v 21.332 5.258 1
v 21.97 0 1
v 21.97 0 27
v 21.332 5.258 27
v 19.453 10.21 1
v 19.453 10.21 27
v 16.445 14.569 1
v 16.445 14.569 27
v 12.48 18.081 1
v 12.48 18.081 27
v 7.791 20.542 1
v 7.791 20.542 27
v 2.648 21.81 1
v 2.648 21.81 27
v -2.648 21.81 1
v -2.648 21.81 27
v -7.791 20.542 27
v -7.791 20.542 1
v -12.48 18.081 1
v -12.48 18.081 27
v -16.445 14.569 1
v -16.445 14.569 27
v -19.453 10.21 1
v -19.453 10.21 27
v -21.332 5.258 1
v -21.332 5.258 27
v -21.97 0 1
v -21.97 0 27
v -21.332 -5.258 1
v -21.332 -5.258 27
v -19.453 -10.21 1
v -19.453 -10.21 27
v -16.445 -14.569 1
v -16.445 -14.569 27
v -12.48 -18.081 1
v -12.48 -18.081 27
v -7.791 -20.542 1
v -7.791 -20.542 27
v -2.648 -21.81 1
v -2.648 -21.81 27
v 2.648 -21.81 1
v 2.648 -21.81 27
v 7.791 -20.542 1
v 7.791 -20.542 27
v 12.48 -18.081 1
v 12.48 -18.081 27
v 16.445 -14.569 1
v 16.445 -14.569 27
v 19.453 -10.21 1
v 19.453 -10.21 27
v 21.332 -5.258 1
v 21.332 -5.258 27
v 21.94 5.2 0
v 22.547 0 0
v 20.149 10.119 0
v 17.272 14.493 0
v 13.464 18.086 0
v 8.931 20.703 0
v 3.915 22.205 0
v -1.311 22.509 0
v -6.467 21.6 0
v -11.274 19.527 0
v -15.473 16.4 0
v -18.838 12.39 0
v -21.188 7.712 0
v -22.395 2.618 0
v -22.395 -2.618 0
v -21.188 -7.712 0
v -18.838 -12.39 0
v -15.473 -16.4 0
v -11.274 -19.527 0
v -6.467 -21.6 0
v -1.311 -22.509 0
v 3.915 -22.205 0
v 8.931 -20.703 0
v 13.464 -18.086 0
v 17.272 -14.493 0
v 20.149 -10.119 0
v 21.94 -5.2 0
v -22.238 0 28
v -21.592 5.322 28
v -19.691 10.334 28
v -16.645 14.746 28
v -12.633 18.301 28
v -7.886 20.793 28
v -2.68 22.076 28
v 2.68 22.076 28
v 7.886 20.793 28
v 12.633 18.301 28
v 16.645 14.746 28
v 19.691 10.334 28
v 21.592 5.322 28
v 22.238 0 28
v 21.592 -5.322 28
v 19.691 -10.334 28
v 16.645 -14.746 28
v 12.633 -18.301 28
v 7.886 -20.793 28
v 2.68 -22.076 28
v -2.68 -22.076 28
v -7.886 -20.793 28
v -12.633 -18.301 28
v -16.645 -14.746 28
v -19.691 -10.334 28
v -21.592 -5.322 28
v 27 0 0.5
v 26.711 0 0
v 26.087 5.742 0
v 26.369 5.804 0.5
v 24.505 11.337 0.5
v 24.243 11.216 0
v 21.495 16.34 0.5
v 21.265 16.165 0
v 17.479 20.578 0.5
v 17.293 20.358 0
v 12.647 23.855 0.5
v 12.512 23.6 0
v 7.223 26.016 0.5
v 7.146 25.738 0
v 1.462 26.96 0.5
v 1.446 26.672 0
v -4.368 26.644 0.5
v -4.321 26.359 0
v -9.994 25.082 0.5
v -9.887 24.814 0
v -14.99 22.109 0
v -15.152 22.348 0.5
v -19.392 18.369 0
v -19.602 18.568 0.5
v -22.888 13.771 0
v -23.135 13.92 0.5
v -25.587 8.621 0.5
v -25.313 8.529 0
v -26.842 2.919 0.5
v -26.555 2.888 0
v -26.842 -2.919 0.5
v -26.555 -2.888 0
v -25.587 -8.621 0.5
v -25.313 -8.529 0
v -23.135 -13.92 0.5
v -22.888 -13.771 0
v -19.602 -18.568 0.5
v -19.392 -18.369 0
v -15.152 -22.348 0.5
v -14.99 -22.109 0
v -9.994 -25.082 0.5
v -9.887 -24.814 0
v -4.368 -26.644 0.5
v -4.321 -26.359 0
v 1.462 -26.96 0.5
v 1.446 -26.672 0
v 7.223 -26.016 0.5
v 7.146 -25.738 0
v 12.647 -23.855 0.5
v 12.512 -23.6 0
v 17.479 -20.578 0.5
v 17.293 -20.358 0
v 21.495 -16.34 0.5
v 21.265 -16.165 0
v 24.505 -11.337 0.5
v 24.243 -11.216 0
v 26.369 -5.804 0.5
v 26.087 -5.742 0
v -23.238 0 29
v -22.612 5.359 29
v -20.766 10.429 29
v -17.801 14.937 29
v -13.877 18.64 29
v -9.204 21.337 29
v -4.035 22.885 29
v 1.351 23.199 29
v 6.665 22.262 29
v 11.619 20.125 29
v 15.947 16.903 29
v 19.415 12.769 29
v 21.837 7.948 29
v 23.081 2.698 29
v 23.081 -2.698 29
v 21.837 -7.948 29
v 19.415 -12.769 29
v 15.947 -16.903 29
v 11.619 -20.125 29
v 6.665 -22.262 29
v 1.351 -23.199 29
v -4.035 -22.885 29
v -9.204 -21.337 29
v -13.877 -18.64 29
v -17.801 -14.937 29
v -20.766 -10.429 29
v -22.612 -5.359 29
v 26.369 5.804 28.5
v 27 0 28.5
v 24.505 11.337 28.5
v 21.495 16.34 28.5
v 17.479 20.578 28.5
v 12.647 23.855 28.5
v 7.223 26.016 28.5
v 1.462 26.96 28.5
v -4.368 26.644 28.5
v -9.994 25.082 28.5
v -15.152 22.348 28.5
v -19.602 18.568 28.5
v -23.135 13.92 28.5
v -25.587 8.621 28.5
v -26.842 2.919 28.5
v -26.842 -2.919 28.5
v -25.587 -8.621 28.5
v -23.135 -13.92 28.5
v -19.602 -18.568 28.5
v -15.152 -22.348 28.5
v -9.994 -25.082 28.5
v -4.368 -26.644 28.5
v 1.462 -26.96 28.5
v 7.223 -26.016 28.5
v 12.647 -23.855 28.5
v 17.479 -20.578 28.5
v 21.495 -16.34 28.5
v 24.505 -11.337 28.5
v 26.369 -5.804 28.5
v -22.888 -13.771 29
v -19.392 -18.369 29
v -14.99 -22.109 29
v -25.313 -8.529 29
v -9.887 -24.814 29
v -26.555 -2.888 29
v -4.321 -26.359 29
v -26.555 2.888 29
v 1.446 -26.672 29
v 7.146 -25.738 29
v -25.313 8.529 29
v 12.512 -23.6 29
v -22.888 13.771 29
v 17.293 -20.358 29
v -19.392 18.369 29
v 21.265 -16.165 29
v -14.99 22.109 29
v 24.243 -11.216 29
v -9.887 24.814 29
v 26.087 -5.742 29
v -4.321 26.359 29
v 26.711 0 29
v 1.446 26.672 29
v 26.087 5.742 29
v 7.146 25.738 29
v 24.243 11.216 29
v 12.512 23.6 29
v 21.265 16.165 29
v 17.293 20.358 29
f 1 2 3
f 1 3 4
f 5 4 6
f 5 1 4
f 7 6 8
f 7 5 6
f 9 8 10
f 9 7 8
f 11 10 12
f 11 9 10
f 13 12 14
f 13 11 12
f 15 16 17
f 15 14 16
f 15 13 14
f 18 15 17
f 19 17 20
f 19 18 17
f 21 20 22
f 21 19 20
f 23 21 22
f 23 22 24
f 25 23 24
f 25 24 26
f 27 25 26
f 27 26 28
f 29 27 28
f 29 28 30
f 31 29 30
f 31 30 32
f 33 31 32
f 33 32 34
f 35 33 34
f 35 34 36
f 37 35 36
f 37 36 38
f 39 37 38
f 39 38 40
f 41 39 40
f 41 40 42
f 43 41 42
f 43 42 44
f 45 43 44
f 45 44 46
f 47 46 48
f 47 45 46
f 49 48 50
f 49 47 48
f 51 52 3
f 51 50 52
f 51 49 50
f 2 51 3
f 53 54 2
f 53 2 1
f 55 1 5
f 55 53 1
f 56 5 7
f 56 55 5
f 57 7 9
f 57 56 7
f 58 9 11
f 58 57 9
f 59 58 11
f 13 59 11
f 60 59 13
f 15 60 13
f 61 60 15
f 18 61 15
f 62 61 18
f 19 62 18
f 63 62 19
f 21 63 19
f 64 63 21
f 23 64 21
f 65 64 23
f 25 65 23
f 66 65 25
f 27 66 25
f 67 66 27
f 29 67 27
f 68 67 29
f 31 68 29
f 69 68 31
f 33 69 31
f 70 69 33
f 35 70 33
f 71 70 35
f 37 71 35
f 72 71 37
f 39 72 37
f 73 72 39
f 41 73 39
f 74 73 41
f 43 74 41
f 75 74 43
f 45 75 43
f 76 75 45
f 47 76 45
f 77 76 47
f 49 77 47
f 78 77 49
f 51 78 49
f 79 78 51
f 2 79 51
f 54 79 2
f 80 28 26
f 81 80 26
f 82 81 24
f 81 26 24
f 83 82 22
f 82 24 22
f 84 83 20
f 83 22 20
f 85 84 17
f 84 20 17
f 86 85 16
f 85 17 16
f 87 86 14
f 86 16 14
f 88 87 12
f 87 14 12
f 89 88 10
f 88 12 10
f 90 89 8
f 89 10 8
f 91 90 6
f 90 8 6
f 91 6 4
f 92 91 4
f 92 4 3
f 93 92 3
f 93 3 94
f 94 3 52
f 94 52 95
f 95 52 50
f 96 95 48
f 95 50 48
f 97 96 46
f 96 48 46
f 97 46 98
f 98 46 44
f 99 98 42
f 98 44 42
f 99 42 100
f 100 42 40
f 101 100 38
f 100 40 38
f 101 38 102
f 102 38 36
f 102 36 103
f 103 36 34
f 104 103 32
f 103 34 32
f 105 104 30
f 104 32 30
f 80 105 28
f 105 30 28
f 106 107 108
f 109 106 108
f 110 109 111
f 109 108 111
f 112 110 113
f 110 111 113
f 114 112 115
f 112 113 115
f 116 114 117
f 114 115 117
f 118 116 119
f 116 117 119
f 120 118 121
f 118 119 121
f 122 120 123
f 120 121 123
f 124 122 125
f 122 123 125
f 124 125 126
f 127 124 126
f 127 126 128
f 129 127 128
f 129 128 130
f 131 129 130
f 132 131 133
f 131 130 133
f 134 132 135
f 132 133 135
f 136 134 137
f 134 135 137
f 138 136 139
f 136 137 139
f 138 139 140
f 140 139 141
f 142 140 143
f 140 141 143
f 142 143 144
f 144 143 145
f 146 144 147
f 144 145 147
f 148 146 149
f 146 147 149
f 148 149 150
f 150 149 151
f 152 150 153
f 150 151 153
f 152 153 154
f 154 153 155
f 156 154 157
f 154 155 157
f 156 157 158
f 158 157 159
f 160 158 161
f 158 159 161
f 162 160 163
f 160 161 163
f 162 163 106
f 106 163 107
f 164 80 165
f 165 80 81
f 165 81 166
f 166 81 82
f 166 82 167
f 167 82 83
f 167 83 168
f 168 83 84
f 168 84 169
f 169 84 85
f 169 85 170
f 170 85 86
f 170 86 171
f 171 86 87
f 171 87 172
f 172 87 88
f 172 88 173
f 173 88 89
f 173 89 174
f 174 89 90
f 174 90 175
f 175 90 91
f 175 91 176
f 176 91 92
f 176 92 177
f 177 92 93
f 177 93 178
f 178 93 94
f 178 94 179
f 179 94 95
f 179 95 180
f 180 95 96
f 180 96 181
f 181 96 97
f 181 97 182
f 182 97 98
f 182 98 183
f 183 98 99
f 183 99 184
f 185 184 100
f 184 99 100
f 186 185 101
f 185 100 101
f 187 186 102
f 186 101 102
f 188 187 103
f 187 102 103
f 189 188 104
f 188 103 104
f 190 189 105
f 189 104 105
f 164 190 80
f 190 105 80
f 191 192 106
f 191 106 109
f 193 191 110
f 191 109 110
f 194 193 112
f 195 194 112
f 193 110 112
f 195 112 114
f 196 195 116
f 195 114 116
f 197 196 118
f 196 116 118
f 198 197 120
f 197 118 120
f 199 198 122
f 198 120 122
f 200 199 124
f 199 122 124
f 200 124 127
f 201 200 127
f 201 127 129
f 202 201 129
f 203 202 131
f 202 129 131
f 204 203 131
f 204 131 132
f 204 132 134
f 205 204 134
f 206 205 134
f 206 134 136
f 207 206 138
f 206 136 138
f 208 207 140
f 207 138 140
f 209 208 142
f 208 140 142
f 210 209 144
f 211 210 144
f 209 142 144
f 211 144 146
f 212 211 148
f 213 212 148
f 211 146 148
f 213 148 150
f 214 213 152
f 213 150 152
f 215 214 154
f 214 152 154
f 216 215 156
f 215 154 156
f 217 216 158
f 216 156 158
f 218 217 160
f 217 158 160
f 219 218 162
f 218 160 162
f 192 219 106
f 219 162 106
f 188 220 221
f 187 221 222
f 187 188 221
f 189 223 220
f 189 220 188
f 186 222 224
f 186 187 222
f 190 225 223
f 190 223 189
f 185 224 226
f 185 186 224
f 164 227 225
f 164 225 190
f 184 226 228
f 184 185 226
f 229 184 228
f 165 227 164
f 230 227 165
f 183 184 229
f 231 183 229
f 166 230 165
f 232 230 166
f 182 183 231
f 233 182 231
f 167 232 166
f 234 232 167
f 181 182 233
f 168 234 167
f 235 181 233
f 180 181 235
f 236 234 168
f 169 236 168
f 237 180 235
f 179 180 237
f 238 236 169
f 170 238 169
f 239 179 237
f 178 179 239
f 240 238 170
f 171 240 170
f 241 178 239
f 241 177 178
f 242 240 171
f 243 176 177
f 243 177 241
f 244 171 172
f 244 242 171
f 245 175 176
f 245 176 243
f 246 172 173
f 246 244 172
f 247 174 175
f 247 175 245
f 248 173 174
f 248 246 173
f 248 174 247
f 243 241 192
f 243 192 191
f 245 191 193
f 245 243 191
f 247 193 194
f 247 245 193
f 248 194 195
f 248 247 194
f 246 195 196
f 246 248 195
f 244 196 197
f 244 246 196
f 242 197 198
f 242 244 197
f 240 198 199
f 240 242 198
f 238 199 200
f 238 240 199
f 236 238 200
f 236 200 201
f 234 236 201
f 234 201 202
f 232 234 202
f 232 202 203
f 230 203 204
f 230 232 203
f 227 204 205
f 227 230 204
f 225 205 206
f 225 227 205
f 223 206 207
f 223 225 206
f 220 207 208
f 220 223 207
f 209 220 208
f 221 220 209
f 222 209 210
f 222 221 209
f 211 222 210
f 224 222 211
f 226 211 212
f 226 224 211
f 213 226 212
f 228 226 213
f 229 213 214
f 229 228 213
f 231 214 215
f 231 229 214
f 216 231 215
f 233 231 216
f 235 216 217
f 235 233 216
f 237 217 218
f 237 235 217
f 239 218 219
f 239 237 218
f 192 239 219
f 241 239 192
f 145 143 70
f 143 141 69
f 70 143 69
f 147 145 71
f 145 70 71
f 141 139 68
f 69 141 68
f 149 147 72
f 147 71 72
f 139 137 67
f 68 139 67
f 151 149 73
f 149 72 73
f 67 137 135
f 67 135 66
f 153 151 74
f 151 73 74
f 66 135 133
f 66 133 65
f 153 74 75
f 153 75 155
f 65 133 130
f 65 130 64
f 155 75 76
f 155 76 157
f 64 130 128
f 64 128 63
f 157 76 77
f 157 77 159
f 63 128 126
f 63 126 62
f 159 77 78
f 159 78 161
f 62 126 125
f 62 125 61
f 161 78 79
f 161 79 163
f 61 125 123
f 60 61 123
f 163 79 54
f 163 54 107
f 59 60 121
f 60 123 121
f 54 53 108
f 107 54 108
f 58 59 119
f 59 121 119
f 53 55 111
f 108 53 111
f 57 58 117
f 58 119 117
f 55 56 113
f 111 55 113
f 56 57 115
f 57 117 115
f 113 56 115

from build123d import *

# Parameters (mm, degrees)
F0_R     = 27
F0_R_2   = 21.97
F1_DEPTH = 29
F2_SIZE2 = 0.2886751346
F2_SIZE  = 0.5
F3_SIZE2 = 0.5773502692
F3_SIZE  = 1


with BuildPart() as f1:
    # F0 (on Top) → F1 (new body)
    with BuildSketch(Plane.XY):
        Circle(F0_R)
        Circle(F0_R_2, mode=Mode.SUBTRACT)
    extrude(amount=F1_DEPTH)

    # F2
    f2_edges = [f1.edges().sort_by_distance(p)[0] for p in [
        (-27, 0, 29),
        (-27, 0, 0),
    ]]
    f2_side = f1.faces().sort_by_distance((-27, 0, 14.5))[0]
    chamfer(f2_edges, length=F2_SIZE, length2=F2_SIZE2, reference=f2_side)

    # F3
    f3_edges = [f1.edges().sort_by_distance(p)[0] for p in [
        (-21.97, 0, 0),
    ]]
    f3_side = f1.faces().sort_by_distance((-21.97, 0, 14.5))[0]
    chamfer(f3_edges, length=F3_SIZE, length2=F3_SIZE2, reference=f3_side)

    # F4 (on Front) → F5 (revolve, cut)
    with BuildSketch(Plane.XZ):
        Polygon((-22.2379491924, 28), (-21.97, 27), (-21.97, 29), (-23.2379491924, 29), align=None)
    revolve(axis=Axis((0, 0, 15.0005389005), (0, 0, -1)), mode=Mode.SUBTRACT)


solid = f1.part
